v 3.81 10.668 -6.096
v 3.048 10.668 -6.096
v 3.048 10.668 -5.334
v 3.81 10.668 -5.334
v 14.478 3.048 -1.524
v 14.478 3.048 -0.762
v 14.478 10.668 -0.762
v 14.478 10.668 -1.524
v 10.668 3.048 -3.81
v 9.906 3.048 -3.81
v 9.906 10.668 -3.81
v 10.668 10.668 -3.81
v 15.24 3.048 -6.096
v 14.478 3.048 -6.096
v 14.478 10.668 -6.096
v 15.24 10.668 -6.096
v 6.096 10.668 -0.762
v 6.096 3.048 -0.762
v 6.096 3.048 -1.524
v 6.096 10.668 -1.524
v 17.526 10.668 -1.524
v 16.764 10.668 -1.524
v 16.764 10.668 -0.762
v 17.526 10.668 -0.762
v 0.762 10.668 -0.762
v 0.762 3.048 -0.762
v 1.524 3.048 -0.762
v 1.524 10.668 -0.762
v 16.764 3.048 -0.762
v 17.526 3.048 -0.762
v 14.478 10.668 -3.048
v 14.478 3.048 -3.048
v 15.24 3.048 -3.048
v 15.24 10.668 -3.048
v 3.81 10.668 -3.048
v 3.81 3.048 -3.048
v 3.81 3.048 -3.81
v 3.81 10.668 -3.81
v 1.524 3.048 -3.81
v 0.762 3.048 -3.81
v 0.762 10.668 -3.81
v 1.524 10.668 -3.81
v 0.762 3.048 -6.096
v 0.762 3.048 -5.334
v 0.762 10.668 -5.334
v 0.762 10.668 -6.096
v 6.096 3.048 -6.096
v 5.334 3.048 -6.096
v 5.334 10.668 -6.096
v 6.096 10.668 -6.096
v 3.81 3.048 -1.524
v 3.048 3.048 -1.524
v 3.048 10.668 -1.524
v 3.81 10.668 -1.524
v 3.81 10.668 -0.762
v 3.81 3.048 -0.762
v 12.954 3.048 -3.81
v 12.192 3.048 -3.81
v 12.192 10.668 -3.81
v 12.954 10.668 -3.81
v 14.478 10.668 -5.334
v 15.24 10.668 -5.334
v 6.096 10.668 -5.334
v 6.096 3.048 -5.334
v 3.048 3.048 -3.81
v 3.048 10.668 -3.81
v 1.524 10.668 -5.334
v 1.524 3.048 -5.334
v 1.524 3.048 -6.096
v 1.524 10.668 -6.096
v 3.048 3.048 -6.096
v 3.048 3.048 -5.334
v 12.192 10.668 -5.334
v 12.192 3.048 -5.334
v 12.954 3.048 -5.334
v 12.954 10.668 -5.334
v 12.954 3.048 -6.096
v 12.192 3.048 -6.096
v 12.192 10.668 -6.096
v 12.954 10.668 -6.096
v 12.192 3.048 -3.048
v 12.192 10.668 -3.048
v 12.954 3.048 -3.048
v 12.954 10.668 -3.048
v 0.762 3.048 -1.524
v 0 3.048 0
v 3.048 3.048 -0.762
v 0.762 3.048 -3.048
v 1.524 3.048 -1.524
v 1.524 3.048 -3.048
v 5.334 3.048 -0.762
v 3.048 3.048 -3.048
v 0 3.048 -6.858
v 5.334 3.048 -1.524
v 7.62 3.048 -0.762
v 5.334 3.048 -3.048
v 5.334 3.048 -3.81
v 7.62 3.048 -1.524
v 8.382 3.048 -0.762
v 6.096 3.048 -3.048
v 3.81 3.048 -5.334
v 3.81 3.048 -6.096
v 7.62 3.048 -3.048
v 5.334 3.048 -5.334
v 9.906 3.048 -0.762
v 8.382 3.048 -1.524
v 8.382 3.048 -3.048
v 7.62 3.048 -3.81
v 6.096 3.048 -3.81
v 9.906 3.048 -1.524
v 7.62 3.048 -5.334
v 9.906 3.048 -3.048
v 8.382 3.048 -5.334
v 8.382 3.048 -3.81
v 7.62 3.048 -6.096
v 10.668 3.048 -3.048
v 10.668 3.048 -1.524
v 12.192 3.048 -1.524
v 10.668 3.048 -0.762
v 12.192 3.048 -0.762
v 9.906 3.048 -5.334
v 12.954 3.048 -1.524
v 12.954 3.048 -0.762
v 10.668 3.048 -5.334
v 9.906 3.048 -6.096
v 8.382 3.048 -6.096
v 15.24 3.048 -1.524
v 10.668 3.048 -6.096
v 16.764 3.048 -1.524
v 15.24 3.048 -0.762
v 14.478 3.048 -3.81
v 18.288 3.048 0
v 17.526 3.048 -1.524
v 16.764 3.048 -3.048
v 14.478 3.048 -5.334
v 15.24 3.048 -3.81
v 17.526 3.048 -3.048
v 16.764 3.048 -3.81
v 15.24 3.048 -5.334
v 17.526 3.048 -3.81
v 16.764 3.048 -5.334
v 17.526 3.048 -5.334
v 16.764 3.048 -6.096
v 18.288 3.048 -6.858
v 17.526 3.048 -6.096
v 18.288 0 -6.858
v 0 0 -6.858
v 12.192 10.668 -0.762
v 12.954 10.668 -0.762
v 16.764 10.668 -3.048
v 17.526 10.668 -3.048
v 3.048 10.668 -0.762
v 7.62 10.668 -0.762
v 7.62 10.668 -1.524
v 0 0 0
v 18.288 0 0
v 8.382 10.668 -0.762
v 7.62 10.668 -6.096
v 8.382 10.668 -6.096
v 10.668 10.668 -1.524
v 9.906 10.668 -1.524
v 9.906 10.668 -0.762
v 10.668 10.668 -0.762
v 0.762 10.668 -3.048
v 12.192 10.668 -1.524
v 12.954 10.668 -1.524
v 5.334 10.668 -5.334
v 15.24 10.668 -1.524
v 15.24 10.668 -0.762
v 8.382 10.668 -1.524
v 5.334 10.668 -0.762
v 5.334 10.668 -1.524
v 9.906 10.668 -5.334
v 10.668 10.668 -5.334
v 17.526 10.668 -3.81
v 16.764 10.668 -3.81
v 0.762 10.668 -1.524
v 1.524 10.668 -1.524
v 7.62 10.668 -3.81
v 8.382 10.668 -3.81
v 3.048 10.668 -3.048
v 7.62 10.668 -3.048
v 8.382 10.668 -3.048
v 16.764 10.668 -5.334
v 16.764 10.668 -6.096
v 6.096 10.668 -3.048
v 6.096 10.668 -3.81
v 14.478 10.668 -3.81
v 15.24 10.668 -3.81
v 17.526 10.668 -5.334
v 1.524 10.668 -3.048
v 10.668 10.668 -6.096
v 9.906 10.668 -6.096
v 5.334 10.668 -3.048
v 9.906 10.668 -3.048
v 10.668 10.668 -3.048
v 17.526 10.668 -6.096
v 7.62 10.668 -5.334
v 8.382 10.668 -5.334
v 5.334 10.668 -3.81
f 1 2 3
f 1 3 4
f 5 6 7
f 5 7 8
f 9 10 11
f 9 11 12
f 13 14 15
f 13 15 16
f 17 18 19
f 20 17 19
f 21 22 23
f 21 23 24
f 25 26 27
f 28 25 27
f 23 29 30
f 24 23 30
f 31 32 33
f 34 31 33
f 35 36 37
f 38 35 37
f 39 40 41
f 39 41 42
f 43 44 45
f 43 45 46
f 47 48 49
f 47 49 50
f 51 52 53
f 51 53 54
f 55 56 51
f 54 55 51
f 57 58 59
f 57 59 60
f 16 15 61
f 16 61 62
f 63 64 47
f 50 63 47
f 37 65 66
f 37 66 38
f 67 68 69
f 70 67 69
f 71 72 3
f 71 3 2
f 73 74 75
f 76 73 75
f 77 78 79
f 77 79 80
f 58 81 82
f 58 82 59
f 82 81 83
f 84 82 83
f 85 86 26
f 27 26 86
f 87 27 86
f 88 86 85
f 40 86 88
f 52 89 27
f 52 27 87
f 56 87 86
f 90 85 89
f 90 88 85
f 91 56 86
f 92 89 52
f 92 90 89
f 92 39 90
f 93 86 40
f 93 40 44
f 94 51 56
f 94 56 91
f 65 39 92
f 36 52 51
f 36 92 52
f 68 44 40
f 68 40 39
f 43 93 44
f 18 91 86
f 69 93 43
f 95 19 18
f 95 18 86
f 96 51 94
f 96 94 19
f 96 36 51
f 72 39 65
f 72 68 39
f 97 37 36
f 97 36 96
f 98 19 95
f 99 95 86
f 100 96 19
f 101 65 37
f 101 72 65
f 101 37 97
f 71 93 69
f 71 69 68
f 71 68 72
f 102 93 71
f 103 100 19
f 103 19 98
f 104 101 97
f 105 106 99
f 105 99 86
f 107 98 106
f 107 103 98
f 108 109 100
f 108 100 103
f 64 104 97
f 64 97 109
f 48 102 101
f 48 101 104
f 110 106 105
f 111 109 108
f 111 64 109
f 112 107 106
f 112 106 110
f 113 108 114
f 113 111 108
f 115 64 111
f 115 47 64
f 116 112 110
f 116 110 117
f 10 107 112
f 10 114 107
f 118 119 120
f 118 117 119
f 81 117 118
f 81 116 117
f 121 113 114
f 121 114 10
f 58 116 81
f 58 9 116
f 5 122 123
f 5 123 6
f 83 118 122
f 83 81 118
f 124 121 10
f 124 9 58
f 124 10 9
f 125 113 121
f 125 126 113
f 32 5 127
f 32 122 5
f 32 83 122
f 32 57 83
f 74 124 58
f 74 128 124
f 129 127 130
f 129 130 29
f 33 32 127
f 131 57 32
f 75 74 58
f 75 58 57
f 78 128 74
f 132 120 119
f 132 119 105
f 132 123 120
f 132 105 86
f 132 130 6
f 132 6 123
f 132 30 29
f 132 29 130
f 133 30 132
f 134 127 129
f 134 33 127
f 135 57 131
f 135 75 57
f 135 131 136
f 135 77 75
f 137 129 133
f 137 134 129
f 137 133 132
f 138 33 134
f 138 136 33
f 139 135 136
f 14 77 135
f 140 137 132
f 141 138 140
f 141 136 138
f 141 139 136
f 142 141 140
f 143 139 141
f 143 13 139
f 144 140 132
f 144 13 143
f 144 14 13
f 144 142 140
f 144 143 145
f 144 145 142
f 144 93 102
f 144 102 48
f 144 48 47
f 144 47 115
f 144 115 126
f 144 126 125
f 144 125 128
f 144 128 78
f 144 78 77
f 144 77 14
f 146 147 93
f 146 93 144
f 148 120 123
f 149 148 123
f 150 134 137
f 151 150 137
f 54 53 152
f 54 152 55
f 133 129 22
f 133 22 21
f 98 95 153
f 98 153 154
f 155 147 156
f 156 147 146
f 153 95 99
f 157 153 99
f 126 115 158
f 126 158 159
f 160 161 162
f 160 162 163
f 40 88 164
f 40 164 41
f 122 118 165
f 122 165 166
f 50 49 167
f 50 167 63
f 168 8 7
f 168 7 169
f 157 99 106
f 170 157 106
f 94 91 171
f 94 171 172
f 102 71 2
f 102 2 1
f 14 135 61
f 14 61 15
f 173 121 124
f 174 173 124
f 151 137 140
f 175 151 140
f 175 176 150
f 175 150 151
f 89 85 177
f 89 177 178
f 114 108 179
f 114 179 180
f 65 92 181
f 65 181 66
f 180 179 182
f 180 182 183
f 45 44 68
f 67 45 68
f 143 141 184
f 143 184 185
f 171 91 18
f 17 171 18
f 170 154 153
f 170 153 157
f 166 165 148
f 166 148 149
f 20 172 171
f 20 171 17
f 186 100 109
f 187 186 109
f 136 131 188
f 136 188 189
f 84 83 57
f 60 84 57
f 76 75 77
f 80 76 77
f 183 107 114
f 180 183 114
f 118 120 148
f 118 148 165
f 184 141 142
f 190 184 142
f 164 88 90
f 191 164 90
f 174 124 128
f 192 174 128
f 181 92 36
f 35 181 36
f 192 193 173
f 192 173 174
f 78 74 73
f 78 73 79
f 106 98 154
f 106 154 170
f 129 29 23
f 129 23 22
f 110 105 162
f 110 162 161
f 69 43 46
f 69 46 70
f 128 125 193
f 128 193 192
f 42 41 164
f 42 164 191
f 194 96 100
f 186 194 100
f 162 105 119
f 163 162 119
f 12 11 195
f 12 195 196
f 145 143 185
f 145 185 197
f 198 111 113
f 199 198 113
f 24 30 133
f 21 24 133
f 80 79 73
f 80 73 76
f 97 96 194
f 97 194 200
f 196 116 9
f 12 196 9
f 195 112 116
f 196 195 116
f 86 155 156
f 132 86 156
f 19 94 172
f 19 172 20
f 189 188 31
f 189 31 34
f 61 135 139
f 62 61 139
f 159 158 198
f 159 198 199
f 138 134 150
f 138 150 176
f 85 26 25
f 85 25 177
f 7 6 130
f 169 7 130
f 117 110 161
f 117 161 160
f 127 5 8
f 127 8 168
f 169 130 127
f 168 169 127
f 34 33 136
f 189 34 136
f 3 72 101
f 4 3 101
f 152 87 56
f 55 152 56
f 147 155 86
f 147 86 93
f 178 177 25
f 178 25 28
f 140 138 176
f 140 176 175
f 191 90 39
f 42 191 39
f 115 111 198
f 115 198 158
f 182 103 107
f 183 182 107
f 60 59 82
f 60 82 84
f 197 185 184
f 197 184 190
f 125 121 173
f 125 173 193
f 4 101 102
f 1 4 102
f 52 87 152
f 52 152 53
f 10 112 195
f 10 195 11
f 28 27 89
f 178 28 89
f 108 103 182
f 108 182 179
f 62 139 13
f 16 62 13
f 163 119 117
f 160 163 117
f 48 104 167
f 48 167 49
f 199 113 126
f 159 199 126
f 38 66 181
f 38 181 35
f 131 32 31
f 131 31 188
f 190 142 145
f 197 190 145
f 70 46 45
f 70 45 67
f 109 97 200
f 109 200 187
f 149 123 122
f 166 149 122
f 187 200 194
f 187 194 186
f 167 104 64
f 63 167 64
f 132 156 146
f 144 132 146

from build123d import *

# Parameters (mm, degrees)
SKETCH1_W      = 18.288
SKETCH1_H      = 6.858
EXTRUDE1_DEPTH = 3.048
SKETCH2_W      = 0.762
SKETCH2_H      = 0.762
EXTRUDE2_DEPTH = 7.62


with BuildPart() as part:
    # Sketch1 → Extrude1 (new body)
    with BuildSketch(Plane(origin=(0, 0, 0), x_dir=(1, 0, 0), z_dir=(0, 1, 0))):
        with Locations((9.144, 3.429)):
            Rectangle(SKETCH1_W, SKETCH1_H)
    extrude(amount=EXTRUDE1_DEPTH)

    # Sketch2 → Extrude2 (add)
    with BuildSketch(Plane(origin=(0, 3.048, 0), x_dir=(1, 0, 0), z_dir=(0, 1, 0))):
        with Locations((3.429, 5.715)):
            Rectangle(SKETCH2_W, SKETCH2_H)
        with Locations((1.143, 5.715)):
            Rectangle(SKETCH2_W, SKETCH2_H)
        with Locations((5.715, 5.715)):
            Rectangle(SKETCH2_W, SKETCH2_H)
        with Locations((8.001, 5.715)):
            Rectangle(SKETCH2_W, SKETCH2_H)
        with Locations((10.287, 5.715)):
            Rectangle(SKETCH2_W, SKETCH2_H)
        with Locations((12.573, 5.715)):
            Rectangle(SKETCH2_W, SKETCH2_H)
        with Locations((14.859, 5.715)):
            Rectangle(SKETCH2_W, SKETCH2_H)
        with Locations((17.145, 5.715)):
            Rectangle(SKETCH2_W, SKETCH2_H)
        with Locations((1.143, 3.429)):
            Rectangle(SKETCH2_W, SKETCH2_H)
        with Locations((3.429, 3.429)):
            Rectangle(SKETCH2_W, SKETCH2_H)
        with Locations((5.715, 3.429)):
            Rectangle(SKETCH2_W, SKETCH2_H)
        with Locations((8.001, 3.429)):
            Rectangle(SKETCH2_W, SKETCH2_H)
        with Locations((10.287, 3.429)):
            Rectangle(SKETCH2_W, SKETCH2_H)
        with Locations((12.573, 3.429)):
            Rectangle(SKETCH2_W, SKETCH2_H)
        with Locations((14.859, 3.429)):
            Rectangle(SKETCH2_W, SKETCH2_H)
        with Locations((17.145, 3.429)):
            Rectangle(SKETCH2_W, SKETCH2_H)
        with Locations((1.143, 1.143)):
            Rectangle(SKETCH2_W, SKETCH2_H)
        with Locations((3.429, 1.143)):
            Rectangle(SKETCH2_W, SKETCH2_H)
        with Locations((5.715, 1.143)):
            Rectangle(SKETCH2_W, SKETCH2_H)
        with Locations((8.001, 1.143)):
            Rectangle(SKETCH2_W, SKETCH2_H)
        with Locations((10.287, 1.143)):
            Rectangle(SKETCH2_W, SKETCH2_H)
        with Locations((12.573, 1.143)):
            Rectangle(SKETCH2_W, SKETCH2_H)
        with Locations((14.859, 1.143)):
            Rectangle(SKETCH2_W, SKETCH2_H)
        with Locations((17.145, 1.143)):
            Rectangle(SKETCH2_W, SKETCH2_H)
    extrude(amount=EXTRUDE2_DEPTH)


solid = part.part
